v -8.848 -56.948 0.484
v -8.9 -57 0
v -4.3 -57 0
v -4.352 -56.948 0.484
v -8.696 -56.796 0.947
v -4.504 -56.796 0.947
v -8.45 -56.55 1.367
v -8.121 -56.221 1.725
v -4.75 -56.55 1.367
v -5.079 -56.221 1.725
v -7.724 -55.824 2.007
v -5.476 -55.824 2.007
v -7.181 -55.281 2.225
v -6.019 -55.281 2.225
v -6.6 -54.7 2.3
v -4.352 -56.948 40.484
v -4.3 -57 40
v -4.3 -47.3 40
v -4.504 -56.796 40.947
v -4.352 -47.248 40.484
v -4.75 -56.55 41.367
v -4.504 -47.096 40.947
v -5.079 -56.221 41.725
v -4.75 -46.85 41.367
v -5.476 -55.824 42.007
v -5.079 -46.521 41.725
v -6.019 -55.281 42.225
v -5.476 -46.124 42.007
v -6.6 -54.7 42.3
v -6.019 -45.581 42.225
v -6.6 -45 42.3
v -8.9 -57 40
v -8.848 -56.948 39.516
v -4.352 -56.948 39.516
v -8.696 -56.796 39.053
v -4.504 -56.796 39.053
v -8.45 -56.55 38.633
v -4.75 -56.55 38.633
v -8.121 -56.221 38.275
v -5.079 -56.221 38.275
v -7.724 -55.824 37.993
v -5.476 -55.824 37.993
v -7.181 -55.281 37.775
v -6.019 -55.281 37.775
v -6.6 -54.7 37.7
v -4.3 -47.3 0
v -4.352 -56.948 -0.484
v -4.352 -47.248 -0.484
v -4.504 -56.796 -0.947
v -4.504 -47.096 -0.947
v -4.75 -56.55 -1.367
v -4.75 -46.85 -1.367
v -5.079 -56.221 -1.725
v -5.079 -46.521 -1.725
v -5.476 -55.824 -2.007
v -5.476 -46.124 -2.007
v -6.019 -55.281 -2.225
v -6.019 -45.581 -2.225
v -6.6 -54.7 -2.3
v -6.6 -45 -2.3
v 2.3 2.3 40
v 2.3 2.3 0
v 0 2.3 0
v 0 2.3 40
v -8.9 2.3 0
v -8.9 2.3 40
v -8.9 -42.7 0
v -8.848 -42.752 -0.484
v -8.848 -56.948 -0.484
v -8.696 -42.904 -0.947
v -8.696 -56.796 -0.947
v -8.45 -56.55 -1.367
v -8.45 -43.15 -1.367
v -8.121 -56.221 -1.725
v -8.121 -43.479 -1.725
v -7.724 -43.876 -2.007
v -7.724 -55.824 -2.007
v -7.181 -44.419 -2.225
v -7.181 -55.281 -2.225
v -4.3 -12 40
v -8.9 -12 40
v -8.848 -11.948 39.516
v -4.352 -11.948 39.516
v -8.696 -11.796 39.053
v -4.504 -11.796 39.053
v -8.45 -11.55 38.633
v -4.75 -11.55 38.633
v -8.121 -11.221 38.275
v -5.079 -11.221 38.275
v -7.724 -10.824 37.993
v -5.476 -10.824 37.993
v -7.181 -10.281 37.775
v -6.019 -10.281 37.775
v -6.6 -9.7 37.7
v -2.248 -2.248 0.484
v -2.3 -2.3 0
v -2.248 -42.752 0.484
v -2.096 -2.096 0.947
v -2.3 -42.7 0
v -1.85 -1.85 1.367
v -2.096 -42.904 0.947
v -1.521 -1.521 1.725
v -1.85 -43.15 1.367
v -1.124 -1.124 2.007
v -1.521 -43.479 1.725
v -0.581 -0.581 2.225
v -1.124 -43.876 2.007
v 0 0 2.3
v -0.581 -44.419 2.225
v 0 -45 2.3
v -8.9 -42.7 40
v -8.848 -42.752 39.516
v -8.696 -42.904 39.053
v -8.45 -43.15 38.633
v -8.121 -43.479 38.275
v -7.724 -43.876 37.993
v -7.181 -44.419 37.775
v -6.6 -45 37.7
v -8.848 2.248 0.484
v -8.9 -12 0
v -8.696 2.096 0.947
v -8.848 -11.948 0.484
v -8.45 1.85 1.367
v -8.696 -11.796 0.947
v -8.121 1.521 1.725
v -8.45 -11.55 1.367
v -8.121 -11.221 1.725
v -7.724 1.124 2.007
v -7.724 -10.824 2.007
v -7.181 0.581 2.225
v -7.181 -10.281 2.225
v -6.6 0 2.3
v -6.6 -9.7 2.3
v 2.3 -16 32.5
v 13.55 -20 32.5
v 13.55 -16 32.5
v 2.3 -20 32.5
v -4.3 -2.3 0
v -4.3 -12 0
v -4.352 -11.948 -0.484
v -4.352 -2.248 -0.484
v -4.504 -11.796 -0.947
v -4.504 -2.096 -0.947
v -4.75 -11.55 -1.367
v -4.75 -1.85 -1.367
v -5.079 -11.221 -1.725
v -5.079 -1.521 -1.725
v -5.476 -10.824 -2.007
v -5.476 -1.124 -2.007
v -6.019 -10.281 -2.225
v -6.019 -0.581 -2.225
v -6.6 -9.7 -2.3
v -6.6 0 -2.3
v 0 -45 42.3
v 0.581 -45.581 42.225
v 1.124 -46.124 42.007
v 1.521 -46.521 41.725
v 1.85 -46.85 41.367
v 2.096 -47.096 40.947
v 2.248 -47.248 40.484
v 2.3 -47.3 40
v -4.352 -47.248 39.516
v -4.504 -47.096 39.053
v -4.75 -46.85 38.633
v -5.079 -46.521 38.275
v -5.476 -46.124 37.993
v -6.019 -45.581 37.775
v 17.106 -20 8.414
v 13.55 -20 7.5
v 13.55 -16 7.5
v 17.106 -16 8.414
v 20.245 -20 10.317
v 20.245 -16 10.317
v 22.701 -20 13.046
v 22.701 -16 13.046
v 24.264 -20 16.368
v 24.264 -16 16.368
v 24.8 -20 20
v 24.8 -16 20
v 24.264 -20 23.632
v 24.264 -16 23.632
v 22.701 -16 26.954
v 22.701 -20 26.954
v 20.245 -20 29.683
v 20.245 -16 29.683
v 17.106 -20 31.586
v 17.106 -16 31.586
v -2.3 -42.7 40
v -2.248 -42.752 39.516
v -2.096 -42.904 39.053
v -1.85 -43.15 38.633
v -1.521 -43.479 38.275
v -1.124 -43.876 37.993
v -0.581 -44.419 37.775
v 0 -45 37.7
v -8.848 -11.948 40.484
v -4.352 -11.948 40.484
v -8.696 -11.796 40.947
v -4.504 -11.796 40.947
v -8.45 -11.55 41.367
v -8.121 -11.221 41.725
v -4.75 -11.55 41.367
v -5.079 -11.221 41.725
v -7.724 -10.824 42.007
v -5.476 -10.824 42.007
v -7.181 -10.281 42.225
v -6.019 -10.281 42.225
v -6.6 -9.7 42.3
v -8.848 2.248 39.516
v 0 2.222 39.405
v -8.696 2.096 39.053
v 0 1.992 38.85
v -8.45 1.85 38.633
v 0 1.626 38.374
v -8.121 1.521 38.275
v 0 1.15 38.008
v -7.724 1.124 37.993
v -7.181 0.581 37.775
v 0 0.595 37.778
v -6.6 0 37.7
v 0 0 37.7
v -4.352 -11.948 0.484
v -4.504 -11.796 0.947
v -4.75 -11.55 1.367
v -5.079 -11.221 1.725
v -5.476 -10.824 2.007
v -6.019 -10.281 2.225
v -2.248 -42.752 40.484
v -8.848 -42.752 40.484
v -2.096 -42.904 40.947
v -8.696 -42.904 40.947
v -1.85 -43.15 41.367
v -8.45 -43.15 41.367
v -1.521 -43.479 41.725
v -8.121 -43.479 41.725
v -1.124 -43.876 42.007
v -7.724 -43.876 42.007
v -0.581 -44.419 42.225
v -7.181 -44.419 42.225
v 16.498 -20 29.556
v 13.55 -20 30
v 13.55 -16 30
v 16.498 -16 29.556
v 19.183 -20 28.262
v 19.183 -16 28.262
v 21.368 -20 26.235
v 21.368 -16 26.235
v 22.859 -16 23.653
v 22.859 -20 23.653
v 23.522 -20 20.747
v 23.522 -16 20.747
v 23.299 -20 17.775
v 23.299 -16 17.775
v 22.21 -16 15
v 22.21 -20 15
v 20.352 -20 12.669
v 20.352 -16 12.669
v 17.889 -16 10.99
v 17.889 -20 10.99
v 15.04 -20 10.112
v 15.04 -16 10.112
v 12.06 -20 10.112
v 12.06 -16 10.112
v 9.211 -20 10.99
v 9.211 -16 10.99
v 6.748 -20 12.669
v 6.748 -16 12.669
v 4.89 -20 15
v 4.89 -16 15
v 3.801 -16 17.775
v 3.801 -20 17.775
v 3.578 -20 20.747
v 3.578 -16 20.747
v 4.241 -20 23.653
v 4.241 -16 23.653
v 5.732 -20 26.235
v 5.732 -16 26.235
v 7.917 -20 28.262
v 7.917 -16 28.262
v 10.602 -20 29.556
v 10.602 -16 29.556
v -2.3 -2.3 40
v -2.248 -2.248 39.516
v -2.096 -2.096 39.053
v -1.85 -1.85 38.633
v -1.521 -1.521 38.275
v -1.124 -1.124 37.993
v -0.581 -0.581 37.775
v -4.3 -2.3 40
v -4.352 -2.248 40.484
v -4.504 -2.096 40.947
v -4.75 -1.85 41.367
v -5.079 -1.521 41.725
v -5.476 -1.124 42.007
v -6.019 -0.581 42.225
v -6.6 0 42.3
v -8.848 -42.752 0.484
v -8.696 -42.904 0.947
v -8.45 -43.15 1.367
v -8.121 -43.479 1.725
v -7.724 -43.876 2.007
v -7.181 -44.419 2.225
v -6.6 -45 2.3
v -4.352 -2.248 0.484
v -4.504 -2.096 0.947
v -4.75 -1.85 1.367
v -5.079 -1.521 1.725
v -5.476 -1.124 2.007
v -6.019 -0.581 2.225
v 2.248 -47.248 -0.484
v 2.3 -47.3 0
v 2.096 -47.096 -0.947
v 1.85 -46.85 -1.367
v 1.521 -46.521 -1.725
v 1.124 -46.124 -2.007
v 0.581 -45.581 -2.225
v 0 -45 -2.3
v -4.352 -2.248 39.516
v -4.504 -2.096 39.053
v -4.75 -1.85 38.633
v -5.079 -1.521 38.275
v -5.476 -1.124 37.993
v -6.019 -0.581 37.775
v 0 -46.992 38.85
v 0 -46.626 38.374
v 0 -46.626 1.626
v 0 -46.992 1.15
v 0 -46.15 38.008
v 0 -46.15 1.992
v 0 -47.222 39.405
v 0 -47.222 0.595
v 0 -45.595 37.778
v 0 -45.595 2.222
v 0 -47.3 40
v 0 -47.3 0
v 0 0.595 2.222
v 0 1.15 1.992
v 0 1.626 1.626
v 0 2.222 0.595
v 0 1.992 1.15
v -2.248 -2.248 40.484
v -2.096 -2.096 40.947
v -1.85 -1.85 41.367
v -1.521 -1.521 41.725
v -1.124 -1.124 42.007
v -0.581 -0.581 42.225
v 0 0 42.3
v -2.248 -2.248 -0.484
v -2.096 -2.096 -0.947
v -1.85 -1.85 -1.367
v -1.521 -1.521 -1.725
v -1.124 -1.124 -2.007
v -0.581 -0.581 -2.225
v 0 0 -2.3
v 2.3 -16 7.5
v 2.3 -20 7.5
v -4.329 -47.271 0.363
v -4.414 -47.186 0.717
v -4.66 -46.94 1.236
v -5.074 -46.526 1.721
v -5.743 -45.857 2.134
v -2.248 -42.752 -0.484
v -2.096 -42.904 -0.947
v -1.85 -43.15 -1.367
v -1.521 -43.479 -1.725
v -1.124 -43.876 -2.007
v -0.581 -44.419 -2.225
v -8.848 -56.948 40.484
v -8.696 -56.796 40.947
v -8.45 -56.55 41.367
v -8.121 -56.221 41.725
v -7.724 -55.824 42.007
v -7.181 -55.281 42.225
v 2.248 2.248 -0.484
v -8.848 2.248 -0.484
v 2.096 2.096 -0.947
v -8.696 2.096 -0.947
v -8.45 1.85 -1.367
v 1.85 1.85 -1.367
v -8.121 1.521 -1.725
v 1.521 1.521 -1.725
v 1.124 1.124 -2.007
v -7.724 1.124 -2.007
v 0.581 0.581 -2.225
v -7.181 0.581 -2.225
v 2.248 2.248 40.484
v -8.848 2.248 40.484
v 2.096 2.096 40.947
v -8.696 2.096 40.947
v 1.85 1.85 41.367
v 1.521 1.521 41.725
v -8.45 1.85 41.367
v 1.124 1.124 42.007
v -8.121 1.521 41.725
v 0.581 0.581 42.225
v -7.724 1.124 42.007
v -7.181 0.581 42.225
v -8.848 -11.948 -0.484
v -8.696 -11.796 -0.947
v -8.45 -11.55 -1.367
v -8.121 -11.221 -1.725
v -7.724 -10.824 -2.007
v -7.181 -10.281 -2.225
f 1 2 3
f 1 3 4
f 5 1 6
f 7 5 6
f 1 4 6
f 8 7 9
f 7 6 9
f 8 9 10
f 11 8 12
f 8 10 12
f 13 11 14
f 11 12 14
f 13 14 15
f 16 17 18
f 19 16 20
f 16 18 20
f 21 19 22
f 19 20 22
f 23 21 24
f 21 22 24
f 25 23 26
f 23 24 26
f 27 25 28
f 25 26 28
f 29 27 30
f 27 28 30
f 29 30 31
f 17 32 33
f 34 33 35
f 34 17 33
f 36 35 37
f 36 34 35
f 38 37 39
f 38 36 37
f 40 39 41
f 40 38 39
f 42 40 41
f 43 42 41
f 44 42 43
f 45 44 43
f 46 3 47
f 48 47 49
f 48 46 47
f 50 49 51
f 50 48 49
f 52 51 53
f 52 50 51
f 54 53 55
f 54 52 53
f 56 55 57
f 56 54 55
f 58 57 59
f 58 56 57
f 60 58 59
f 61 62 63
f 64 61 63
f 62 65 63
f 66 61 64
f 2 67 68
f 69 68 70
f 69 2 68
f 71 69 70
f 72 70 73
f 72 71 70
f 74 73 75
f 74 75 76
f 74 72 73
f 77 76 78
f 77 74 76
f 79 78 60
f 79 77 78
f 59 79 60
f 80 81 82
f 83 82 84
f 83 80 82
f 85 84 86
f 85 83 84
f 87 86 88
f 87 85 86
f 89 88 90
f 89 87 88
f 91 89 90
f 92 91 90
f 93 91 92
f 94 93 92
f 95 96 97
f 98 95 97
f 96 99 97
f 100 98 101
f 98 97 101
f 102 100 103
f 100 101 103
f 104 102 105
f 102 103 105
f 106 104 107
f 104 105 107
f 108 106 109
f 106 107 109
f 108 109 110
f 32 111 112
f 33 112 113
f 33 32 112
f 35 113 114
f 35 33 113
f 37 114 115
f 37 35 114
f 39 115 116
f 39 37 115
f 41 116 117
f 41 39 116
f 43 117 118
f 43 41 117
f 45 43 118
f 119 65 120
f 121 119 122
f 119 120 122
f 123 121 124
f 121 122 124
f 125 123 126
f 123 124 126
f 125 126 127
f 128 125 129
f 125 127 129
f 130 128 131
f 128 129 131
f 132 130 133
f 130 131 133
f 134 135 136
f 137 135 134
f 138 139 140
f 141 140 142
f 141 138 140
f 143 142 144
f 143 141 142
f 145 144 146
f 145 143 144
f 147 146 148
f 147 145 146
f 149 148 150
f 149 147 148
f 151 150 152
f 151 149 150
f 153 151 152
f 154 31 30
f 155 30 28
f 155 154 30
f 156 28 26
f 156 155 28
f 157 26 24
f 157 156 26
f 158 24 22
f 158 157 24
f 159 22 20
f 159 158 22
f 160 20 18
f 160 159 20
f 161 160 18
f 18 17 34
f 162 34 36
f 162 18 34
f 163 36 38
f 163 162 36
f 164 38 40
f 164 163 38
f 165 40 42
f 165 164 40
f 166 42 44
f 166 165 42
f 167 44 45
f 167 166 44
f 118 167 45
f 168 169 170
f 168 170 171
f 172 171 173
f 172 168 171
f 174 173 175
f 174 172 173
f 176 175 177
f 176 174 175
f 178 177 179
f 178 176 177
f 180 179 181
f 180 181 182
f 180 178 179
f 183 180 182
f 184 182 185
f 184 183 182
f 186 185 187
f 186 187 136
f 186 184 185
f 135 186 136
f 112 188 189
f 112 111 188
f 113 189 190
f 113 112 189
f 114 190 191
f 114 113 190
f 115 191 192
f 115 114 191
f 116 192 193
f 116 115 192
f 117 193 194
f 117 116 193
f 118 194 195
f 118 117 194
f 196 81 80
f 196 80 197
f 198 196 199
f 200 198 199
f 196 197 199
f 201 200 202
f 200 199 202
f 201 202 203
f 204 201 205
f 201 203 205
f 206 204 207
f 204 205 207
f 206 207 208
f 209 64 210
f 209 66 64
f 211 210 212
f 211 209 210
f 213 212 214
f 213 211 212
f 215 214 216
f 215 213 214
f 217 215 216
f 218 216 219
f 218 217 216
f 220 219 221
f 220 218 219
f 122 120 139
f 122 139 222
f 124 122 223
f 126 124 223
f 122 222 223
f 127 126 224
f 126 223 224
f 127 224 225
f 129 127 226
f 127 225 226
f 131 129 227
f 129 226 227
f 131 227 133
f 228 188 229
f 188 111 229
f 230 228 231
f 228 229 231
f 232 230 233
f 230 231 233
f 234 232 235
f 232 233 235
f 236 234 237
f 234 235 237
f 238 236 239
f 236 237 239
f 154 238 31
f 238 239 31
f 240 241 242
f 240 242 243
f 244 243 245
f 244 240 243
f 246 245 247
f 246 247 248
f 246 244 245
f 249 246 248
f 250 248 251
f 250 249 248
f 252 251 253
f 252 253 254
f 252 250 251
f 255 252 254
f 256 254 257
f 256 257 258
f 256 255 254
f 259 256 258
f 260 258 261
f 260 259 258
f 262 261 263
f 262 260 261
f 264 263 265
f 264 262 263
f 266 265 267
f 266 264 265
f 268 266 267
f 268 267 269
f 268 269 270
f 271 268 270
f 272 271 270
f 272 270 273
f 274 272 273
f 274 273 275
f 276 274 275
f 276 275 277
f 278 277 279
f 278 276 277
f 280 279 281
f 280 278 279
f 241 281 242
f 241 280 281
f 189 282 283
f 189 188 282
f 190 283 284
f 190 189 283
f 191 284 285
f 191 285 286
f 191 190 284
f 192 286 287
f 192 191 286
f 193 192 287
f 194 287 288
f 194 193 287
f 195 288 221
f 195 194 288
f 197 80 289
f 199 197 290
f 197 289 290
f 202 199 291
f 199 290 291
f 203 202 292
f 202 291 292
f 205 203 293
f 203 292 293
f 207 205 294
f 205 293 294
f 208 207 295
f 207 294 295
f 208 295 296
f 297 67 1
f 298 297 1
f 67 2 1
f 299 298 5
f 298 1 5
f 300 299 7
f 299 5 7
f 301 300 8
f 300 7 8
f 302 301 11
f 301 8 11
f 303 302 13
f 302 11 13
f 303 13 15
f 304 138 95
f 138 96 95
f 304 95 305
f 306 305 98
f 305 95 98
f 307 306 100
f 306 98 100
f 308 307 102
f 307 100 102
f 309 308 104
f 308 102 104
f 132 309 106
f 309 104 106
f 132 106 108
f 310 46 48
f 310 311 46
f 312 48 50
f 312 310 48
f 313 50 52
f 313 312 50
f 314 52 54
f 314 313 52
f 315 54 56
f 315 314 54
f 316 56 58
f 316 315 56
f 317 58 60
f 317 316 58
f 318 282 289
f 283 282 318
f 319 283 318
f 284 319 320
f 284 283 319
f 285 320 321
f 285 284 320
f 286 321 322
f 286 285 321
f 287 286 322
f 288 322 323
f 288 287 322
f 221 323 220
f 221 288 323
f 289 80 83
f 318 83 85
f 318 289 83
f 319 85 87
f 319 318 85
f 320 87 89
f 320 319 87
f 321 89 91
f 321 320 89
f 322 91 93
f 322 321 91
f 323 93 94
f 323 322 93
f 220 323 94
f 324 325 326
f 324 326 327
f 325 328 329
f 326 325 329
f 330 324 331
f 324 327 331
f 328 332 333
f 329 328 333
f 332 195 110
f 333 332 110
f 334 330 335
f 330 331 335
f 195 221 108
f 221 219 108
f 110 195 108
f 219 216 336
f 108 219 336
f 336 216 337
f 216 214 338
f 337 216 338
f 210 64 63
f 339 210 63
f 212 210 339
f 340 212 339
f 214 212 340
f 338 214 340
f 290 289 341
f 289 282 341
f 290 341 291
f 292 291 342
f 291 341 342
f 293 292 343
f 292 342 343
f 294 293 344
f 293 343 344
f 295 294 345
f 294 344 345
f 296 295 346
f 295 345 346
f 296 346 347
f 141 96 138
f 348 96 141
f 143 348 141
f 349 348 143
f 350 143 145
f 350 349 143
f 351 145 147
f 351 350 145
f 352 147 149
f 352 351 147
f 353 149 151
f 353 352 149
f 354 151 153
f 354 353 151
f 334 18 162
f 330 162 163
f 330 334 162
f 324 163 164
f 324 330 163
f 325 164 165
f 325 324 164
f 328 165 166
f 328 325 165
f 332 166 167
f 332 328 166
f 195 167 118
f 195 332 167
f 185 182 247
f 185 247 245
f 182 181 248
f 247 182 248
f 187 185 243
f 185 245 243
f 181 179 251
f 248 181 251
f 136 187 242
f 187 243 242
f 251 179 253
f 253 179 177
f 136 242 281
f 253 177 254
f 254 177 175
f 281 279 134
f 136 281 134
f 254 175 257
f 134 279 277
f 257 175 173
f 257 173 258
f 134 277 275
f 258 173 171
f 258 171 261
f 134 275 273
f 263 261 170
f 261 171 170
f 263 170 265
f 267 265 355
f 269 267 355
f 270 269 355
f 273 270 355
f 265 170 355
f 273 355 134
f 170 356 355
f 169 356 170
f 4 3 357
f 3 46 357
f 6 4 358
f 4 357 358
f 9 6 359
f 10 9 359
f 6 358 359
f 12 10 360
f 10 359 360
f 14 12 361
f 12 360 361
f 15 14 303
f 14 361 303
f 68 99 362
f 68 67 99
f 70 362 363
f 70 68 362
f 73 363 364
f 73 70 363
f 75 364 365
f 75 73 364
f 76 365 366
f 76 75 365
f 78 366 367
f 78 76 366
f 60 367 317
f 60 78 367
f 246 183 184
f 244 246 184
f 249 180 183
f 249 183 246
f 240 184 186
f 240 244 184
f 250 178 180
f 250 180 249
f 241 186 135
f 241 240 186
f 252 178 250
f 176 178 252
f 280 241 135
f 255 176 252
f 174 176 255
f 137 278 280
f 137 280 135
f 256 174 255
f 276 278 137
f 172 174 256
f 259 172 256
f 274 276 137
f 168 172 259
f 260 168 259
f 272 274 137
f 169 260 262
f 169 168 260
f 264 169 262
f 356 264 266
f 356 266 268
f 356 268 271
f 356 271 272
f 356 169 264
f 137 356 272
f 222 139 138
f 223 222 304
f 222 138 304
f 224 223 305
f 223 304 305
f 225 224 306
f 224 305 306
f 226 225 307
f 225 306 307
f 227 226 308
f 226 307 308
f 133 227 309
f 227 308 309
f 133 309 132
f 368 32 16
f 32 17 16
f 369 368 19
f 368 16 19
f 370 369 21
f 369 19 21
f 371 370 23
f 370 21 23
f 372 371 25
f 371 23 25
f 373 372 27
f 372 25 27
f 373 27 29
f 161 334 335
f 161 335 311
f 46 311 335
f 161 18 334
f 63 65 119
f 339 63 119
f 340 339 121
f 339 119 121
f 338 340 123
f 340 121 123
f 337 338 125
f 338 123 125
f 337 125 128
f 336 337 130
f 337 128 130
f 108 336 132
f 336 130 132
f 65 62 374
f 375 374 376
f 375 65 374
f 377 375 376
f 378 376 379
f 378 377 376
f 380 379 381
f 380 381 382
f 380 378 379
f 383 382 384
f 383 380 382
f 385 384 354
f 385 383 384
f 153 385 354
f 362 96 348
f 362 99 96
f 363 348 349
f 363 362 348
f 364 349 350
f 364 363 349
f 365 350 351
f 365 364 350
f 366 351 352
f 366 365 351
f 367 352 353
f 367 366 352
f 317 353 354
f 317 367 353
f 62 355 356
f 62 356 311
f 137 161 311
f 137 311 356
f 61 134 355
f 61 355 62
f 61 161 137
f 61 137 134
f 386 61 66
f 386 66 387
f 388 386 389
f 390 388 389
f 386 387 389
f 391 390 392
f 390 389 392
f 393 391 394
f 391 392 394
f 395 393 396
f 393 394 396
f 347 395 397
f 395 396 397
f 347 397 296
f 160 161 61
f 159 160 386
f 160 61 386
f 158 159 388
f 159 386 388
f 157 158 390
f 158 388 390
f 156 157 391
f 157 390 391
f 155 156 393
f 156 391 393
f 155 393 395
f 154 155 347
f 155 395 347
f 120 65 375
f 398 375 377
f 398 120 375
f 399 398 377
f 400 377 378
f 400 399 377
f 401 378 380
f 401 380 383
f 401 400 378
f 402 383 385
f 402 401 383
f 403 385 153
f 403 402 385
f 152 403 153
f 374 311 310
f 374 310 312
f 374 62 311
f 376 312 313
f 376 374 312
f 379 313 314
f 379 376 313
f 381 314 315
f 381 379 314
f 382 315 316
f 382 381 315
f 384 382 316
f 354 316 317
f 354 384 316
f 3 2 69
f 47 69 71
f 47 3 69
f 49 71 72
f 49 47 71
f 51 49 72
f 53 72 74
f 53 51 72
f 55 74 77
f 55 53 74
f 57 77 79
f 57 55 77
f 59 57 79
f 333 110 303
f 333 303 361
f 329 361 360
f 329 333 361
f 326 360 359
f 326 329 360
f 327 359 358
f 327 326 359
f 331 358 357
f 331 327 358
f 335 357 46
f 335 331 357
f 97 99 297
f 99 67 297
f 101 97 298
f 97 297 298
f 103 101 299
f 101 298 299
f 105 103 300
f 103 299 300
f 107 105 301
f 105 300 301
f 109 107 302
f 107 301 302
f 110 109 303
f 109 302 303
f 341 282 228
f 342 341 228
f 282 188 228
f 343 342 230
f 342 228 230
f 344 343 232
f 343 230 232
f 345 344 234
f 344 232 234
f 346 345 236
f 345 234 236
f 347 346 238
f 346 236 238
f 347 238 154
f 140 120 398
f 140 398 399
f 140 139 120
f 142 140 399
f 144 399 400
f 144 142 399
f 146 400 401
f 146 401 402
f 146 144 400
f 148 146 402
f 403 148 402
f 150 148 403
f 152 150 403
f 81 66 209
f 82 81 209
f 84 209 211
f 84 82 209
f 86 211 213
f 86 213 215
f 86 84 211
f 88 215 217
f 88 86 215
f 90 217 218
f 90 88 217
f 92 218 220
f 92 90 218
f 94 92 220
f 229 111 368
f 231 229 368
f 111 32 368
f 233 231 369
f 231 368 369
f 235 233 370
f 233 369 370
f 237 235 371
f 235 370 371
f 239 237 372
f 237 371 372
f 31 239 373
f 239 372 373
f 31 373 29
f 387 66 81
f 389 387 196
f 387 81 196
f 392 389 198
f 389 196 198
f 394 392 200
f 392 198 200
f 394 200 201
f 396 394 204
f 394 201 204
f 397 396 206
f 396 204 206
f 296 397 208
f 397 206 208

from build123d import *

# Parameters (mm, degrees)
EXTRU_MINCE1_DEPTH         = 2.3
CONG_1_R                   = 2.3
ESQUISSE2_W                = 40
ESQUISSE2_H                = 49.6
BOSS_EXTRU_1_DEPTH         = 2.3
R_P_TITION_LIN_AIRE1_COUNT = 2
R_P_TITION_LIN_AIRE1_PITCH = 40
CONG_2_R                   = 2.3
BOSS_EXTRU_2_START         = -20
ESQUISSE3_R                = 10
BOSS_EXTRU_2_DEPTH         = 4


with BuildPart() as part:
    # Esquisse1 → Extru.-Mince1 (new, symmetric)
    with BuildSketch(Plane.XY):
        Polygon((-4.3, -57), (-4.3, -47.3), (2.3, -47.3), (2.3, 2.3), (-8.9, 2.3), (-8.9, -12), (-4.3, -12), (-4.3, -2.3), (-2.3, -2.3), (-2.3, -42.7), (-8.9, -42.7), (-8.9, -57), align=None)
    extru_mince1 = extrude(amount=EXTRU_MINCE1_DEPTH, both=True)

    # Congé1
    cong_1_edges = [part.edges().sort_by_distance(p)[0] for p in [
        (-6.6, -57, -2.3),
        (-4.3, -52.15, -2.3),
        (-1, -47.3, -2.3),
        (2.3, -22.5, -2.3),
        (-3.3, 2.3, -2.3),
        (-8.9, -4.85, -2.3),
        (-6.6, -12, -2.3),
        (-4.3, -7.15, -2.3),
        (-3.3, -2.3, -2.3),
        (-2.3, -22.5, -2.3),
        (-5.6, -42.7, -2.3),
        (-8.9, -49.85, -2.3),
        (-5.6, -42.7, 2.3),
        (-2.3, -22.5, 2.3),
        (-3.3, -2.3, 2.3),
        (-4.3, -7.15, 2.3),
        (-6.6, -12, 2.3),
        (-8.9, -4.85, 2.3),
        (-3.3, 2.3, 2.3),
        (2.3, -22.5, 2.3),
        (-1, -47.3, 2.3),
        (-4.3, -52.15, 2.3),
        (-6.6, -57, 2.3),
        (-8.9, -49.85, 2.3),
    ]]
    fillet(cong_1_edges, radius=CONG_1_R - 0.0001)  # a hair under: the kernel refuses the full size

    # Esquisse2 → Boss.-Extru.1 (add)
    with BuildSketch(Plane(origin=(0, 0, 0), x_dir=(0, 0, -1), z_dir=(1, 0, 0))):
        with Locations((-20, -22.5)):
            Rectangle(ESQUISSE2_W, ESQUISSE2_H)
    extrude(amount=BOSS_EXTRU_1_DEPTH)

    # Répétition linéaire1: Extru.-Mince1 ×2
    with Locations(*[(0, 0, i * R_P_TITION_LIN_AIRE1_PITCH) for i in range(1, R_P_TITION_LIN_AIRE1_COUNT)]):
        add(extru_mince1)

    # Congé2
    cong_2_edges = [part.edges().sort_by_distance(p)[0] for p in [
        (-5.6, -42.7, 42.3),
        (-2.3, -22.5, 42.3),
        (-3.3, -2.3, 42.3),
        (-4.3, -7.15, 42.3),
        (-6.6, -12, 42.3),
        (-8.9, -4.85, 42.3),
        (-3.3, 2.3, 42.3),
        (2.3, -22.5, 42.3),
        (-6.6, -57, 42.3),
        (-4.3, -52.15, 42.3),
        (-1, -47.3, 42.3),
        (-8.9, -49.85, 42.3),
        (-2.15, -47.3, 37.7),
        (-4.3, -52.15, 37.7),
        (-6.6, -57, 37.7),
        (-8.9, -49.85, 37.7),
        (-5.6, -42.7, 37.7),
        (-2.3, -22.5, 37.7),
        (-3.3, -2.3, 37.7),
        (-4.3, -7.15, 37.7),
        (-6.6, -12, 37.7),
        (-8.9, -4.85, 37.7),
        (-4.45, 2.3, 37.7),
    ]]
    fillet(cong_2_edges, radius=CONG_2_R - 0.0001)  # a hair under: the kernel refuses the full size

    # Esquisse3 → Boss.-Extru.2 (add)
    with BuildSketch(Plane(origin=(0, 0, 0), x_dir=(1, 0, 0), z_dir=(0, 1, 0)).offset(BOSS_EXTRU_2_START)):
        with BuildLine():
            Line((2.3, -7.5), (13.55, -7.5))
            ThreePointArc((13.55, -7.5), (24.8, -20), (13.55, -32.5))
            Line((13.55, -32.5), (2.3, -32.5))
            Line((2.3, -32.5), (2.3, -7.5))
        make_face()
        with Locations(Location((13.55, -20, 0), (0, 0, 270))):
            Circle(ESQUISSE3_R, mode=Mode.SUBTRACT)
    extrude(amount=BOSS_EXTRU_2_DEPTH)


solid = part.part
